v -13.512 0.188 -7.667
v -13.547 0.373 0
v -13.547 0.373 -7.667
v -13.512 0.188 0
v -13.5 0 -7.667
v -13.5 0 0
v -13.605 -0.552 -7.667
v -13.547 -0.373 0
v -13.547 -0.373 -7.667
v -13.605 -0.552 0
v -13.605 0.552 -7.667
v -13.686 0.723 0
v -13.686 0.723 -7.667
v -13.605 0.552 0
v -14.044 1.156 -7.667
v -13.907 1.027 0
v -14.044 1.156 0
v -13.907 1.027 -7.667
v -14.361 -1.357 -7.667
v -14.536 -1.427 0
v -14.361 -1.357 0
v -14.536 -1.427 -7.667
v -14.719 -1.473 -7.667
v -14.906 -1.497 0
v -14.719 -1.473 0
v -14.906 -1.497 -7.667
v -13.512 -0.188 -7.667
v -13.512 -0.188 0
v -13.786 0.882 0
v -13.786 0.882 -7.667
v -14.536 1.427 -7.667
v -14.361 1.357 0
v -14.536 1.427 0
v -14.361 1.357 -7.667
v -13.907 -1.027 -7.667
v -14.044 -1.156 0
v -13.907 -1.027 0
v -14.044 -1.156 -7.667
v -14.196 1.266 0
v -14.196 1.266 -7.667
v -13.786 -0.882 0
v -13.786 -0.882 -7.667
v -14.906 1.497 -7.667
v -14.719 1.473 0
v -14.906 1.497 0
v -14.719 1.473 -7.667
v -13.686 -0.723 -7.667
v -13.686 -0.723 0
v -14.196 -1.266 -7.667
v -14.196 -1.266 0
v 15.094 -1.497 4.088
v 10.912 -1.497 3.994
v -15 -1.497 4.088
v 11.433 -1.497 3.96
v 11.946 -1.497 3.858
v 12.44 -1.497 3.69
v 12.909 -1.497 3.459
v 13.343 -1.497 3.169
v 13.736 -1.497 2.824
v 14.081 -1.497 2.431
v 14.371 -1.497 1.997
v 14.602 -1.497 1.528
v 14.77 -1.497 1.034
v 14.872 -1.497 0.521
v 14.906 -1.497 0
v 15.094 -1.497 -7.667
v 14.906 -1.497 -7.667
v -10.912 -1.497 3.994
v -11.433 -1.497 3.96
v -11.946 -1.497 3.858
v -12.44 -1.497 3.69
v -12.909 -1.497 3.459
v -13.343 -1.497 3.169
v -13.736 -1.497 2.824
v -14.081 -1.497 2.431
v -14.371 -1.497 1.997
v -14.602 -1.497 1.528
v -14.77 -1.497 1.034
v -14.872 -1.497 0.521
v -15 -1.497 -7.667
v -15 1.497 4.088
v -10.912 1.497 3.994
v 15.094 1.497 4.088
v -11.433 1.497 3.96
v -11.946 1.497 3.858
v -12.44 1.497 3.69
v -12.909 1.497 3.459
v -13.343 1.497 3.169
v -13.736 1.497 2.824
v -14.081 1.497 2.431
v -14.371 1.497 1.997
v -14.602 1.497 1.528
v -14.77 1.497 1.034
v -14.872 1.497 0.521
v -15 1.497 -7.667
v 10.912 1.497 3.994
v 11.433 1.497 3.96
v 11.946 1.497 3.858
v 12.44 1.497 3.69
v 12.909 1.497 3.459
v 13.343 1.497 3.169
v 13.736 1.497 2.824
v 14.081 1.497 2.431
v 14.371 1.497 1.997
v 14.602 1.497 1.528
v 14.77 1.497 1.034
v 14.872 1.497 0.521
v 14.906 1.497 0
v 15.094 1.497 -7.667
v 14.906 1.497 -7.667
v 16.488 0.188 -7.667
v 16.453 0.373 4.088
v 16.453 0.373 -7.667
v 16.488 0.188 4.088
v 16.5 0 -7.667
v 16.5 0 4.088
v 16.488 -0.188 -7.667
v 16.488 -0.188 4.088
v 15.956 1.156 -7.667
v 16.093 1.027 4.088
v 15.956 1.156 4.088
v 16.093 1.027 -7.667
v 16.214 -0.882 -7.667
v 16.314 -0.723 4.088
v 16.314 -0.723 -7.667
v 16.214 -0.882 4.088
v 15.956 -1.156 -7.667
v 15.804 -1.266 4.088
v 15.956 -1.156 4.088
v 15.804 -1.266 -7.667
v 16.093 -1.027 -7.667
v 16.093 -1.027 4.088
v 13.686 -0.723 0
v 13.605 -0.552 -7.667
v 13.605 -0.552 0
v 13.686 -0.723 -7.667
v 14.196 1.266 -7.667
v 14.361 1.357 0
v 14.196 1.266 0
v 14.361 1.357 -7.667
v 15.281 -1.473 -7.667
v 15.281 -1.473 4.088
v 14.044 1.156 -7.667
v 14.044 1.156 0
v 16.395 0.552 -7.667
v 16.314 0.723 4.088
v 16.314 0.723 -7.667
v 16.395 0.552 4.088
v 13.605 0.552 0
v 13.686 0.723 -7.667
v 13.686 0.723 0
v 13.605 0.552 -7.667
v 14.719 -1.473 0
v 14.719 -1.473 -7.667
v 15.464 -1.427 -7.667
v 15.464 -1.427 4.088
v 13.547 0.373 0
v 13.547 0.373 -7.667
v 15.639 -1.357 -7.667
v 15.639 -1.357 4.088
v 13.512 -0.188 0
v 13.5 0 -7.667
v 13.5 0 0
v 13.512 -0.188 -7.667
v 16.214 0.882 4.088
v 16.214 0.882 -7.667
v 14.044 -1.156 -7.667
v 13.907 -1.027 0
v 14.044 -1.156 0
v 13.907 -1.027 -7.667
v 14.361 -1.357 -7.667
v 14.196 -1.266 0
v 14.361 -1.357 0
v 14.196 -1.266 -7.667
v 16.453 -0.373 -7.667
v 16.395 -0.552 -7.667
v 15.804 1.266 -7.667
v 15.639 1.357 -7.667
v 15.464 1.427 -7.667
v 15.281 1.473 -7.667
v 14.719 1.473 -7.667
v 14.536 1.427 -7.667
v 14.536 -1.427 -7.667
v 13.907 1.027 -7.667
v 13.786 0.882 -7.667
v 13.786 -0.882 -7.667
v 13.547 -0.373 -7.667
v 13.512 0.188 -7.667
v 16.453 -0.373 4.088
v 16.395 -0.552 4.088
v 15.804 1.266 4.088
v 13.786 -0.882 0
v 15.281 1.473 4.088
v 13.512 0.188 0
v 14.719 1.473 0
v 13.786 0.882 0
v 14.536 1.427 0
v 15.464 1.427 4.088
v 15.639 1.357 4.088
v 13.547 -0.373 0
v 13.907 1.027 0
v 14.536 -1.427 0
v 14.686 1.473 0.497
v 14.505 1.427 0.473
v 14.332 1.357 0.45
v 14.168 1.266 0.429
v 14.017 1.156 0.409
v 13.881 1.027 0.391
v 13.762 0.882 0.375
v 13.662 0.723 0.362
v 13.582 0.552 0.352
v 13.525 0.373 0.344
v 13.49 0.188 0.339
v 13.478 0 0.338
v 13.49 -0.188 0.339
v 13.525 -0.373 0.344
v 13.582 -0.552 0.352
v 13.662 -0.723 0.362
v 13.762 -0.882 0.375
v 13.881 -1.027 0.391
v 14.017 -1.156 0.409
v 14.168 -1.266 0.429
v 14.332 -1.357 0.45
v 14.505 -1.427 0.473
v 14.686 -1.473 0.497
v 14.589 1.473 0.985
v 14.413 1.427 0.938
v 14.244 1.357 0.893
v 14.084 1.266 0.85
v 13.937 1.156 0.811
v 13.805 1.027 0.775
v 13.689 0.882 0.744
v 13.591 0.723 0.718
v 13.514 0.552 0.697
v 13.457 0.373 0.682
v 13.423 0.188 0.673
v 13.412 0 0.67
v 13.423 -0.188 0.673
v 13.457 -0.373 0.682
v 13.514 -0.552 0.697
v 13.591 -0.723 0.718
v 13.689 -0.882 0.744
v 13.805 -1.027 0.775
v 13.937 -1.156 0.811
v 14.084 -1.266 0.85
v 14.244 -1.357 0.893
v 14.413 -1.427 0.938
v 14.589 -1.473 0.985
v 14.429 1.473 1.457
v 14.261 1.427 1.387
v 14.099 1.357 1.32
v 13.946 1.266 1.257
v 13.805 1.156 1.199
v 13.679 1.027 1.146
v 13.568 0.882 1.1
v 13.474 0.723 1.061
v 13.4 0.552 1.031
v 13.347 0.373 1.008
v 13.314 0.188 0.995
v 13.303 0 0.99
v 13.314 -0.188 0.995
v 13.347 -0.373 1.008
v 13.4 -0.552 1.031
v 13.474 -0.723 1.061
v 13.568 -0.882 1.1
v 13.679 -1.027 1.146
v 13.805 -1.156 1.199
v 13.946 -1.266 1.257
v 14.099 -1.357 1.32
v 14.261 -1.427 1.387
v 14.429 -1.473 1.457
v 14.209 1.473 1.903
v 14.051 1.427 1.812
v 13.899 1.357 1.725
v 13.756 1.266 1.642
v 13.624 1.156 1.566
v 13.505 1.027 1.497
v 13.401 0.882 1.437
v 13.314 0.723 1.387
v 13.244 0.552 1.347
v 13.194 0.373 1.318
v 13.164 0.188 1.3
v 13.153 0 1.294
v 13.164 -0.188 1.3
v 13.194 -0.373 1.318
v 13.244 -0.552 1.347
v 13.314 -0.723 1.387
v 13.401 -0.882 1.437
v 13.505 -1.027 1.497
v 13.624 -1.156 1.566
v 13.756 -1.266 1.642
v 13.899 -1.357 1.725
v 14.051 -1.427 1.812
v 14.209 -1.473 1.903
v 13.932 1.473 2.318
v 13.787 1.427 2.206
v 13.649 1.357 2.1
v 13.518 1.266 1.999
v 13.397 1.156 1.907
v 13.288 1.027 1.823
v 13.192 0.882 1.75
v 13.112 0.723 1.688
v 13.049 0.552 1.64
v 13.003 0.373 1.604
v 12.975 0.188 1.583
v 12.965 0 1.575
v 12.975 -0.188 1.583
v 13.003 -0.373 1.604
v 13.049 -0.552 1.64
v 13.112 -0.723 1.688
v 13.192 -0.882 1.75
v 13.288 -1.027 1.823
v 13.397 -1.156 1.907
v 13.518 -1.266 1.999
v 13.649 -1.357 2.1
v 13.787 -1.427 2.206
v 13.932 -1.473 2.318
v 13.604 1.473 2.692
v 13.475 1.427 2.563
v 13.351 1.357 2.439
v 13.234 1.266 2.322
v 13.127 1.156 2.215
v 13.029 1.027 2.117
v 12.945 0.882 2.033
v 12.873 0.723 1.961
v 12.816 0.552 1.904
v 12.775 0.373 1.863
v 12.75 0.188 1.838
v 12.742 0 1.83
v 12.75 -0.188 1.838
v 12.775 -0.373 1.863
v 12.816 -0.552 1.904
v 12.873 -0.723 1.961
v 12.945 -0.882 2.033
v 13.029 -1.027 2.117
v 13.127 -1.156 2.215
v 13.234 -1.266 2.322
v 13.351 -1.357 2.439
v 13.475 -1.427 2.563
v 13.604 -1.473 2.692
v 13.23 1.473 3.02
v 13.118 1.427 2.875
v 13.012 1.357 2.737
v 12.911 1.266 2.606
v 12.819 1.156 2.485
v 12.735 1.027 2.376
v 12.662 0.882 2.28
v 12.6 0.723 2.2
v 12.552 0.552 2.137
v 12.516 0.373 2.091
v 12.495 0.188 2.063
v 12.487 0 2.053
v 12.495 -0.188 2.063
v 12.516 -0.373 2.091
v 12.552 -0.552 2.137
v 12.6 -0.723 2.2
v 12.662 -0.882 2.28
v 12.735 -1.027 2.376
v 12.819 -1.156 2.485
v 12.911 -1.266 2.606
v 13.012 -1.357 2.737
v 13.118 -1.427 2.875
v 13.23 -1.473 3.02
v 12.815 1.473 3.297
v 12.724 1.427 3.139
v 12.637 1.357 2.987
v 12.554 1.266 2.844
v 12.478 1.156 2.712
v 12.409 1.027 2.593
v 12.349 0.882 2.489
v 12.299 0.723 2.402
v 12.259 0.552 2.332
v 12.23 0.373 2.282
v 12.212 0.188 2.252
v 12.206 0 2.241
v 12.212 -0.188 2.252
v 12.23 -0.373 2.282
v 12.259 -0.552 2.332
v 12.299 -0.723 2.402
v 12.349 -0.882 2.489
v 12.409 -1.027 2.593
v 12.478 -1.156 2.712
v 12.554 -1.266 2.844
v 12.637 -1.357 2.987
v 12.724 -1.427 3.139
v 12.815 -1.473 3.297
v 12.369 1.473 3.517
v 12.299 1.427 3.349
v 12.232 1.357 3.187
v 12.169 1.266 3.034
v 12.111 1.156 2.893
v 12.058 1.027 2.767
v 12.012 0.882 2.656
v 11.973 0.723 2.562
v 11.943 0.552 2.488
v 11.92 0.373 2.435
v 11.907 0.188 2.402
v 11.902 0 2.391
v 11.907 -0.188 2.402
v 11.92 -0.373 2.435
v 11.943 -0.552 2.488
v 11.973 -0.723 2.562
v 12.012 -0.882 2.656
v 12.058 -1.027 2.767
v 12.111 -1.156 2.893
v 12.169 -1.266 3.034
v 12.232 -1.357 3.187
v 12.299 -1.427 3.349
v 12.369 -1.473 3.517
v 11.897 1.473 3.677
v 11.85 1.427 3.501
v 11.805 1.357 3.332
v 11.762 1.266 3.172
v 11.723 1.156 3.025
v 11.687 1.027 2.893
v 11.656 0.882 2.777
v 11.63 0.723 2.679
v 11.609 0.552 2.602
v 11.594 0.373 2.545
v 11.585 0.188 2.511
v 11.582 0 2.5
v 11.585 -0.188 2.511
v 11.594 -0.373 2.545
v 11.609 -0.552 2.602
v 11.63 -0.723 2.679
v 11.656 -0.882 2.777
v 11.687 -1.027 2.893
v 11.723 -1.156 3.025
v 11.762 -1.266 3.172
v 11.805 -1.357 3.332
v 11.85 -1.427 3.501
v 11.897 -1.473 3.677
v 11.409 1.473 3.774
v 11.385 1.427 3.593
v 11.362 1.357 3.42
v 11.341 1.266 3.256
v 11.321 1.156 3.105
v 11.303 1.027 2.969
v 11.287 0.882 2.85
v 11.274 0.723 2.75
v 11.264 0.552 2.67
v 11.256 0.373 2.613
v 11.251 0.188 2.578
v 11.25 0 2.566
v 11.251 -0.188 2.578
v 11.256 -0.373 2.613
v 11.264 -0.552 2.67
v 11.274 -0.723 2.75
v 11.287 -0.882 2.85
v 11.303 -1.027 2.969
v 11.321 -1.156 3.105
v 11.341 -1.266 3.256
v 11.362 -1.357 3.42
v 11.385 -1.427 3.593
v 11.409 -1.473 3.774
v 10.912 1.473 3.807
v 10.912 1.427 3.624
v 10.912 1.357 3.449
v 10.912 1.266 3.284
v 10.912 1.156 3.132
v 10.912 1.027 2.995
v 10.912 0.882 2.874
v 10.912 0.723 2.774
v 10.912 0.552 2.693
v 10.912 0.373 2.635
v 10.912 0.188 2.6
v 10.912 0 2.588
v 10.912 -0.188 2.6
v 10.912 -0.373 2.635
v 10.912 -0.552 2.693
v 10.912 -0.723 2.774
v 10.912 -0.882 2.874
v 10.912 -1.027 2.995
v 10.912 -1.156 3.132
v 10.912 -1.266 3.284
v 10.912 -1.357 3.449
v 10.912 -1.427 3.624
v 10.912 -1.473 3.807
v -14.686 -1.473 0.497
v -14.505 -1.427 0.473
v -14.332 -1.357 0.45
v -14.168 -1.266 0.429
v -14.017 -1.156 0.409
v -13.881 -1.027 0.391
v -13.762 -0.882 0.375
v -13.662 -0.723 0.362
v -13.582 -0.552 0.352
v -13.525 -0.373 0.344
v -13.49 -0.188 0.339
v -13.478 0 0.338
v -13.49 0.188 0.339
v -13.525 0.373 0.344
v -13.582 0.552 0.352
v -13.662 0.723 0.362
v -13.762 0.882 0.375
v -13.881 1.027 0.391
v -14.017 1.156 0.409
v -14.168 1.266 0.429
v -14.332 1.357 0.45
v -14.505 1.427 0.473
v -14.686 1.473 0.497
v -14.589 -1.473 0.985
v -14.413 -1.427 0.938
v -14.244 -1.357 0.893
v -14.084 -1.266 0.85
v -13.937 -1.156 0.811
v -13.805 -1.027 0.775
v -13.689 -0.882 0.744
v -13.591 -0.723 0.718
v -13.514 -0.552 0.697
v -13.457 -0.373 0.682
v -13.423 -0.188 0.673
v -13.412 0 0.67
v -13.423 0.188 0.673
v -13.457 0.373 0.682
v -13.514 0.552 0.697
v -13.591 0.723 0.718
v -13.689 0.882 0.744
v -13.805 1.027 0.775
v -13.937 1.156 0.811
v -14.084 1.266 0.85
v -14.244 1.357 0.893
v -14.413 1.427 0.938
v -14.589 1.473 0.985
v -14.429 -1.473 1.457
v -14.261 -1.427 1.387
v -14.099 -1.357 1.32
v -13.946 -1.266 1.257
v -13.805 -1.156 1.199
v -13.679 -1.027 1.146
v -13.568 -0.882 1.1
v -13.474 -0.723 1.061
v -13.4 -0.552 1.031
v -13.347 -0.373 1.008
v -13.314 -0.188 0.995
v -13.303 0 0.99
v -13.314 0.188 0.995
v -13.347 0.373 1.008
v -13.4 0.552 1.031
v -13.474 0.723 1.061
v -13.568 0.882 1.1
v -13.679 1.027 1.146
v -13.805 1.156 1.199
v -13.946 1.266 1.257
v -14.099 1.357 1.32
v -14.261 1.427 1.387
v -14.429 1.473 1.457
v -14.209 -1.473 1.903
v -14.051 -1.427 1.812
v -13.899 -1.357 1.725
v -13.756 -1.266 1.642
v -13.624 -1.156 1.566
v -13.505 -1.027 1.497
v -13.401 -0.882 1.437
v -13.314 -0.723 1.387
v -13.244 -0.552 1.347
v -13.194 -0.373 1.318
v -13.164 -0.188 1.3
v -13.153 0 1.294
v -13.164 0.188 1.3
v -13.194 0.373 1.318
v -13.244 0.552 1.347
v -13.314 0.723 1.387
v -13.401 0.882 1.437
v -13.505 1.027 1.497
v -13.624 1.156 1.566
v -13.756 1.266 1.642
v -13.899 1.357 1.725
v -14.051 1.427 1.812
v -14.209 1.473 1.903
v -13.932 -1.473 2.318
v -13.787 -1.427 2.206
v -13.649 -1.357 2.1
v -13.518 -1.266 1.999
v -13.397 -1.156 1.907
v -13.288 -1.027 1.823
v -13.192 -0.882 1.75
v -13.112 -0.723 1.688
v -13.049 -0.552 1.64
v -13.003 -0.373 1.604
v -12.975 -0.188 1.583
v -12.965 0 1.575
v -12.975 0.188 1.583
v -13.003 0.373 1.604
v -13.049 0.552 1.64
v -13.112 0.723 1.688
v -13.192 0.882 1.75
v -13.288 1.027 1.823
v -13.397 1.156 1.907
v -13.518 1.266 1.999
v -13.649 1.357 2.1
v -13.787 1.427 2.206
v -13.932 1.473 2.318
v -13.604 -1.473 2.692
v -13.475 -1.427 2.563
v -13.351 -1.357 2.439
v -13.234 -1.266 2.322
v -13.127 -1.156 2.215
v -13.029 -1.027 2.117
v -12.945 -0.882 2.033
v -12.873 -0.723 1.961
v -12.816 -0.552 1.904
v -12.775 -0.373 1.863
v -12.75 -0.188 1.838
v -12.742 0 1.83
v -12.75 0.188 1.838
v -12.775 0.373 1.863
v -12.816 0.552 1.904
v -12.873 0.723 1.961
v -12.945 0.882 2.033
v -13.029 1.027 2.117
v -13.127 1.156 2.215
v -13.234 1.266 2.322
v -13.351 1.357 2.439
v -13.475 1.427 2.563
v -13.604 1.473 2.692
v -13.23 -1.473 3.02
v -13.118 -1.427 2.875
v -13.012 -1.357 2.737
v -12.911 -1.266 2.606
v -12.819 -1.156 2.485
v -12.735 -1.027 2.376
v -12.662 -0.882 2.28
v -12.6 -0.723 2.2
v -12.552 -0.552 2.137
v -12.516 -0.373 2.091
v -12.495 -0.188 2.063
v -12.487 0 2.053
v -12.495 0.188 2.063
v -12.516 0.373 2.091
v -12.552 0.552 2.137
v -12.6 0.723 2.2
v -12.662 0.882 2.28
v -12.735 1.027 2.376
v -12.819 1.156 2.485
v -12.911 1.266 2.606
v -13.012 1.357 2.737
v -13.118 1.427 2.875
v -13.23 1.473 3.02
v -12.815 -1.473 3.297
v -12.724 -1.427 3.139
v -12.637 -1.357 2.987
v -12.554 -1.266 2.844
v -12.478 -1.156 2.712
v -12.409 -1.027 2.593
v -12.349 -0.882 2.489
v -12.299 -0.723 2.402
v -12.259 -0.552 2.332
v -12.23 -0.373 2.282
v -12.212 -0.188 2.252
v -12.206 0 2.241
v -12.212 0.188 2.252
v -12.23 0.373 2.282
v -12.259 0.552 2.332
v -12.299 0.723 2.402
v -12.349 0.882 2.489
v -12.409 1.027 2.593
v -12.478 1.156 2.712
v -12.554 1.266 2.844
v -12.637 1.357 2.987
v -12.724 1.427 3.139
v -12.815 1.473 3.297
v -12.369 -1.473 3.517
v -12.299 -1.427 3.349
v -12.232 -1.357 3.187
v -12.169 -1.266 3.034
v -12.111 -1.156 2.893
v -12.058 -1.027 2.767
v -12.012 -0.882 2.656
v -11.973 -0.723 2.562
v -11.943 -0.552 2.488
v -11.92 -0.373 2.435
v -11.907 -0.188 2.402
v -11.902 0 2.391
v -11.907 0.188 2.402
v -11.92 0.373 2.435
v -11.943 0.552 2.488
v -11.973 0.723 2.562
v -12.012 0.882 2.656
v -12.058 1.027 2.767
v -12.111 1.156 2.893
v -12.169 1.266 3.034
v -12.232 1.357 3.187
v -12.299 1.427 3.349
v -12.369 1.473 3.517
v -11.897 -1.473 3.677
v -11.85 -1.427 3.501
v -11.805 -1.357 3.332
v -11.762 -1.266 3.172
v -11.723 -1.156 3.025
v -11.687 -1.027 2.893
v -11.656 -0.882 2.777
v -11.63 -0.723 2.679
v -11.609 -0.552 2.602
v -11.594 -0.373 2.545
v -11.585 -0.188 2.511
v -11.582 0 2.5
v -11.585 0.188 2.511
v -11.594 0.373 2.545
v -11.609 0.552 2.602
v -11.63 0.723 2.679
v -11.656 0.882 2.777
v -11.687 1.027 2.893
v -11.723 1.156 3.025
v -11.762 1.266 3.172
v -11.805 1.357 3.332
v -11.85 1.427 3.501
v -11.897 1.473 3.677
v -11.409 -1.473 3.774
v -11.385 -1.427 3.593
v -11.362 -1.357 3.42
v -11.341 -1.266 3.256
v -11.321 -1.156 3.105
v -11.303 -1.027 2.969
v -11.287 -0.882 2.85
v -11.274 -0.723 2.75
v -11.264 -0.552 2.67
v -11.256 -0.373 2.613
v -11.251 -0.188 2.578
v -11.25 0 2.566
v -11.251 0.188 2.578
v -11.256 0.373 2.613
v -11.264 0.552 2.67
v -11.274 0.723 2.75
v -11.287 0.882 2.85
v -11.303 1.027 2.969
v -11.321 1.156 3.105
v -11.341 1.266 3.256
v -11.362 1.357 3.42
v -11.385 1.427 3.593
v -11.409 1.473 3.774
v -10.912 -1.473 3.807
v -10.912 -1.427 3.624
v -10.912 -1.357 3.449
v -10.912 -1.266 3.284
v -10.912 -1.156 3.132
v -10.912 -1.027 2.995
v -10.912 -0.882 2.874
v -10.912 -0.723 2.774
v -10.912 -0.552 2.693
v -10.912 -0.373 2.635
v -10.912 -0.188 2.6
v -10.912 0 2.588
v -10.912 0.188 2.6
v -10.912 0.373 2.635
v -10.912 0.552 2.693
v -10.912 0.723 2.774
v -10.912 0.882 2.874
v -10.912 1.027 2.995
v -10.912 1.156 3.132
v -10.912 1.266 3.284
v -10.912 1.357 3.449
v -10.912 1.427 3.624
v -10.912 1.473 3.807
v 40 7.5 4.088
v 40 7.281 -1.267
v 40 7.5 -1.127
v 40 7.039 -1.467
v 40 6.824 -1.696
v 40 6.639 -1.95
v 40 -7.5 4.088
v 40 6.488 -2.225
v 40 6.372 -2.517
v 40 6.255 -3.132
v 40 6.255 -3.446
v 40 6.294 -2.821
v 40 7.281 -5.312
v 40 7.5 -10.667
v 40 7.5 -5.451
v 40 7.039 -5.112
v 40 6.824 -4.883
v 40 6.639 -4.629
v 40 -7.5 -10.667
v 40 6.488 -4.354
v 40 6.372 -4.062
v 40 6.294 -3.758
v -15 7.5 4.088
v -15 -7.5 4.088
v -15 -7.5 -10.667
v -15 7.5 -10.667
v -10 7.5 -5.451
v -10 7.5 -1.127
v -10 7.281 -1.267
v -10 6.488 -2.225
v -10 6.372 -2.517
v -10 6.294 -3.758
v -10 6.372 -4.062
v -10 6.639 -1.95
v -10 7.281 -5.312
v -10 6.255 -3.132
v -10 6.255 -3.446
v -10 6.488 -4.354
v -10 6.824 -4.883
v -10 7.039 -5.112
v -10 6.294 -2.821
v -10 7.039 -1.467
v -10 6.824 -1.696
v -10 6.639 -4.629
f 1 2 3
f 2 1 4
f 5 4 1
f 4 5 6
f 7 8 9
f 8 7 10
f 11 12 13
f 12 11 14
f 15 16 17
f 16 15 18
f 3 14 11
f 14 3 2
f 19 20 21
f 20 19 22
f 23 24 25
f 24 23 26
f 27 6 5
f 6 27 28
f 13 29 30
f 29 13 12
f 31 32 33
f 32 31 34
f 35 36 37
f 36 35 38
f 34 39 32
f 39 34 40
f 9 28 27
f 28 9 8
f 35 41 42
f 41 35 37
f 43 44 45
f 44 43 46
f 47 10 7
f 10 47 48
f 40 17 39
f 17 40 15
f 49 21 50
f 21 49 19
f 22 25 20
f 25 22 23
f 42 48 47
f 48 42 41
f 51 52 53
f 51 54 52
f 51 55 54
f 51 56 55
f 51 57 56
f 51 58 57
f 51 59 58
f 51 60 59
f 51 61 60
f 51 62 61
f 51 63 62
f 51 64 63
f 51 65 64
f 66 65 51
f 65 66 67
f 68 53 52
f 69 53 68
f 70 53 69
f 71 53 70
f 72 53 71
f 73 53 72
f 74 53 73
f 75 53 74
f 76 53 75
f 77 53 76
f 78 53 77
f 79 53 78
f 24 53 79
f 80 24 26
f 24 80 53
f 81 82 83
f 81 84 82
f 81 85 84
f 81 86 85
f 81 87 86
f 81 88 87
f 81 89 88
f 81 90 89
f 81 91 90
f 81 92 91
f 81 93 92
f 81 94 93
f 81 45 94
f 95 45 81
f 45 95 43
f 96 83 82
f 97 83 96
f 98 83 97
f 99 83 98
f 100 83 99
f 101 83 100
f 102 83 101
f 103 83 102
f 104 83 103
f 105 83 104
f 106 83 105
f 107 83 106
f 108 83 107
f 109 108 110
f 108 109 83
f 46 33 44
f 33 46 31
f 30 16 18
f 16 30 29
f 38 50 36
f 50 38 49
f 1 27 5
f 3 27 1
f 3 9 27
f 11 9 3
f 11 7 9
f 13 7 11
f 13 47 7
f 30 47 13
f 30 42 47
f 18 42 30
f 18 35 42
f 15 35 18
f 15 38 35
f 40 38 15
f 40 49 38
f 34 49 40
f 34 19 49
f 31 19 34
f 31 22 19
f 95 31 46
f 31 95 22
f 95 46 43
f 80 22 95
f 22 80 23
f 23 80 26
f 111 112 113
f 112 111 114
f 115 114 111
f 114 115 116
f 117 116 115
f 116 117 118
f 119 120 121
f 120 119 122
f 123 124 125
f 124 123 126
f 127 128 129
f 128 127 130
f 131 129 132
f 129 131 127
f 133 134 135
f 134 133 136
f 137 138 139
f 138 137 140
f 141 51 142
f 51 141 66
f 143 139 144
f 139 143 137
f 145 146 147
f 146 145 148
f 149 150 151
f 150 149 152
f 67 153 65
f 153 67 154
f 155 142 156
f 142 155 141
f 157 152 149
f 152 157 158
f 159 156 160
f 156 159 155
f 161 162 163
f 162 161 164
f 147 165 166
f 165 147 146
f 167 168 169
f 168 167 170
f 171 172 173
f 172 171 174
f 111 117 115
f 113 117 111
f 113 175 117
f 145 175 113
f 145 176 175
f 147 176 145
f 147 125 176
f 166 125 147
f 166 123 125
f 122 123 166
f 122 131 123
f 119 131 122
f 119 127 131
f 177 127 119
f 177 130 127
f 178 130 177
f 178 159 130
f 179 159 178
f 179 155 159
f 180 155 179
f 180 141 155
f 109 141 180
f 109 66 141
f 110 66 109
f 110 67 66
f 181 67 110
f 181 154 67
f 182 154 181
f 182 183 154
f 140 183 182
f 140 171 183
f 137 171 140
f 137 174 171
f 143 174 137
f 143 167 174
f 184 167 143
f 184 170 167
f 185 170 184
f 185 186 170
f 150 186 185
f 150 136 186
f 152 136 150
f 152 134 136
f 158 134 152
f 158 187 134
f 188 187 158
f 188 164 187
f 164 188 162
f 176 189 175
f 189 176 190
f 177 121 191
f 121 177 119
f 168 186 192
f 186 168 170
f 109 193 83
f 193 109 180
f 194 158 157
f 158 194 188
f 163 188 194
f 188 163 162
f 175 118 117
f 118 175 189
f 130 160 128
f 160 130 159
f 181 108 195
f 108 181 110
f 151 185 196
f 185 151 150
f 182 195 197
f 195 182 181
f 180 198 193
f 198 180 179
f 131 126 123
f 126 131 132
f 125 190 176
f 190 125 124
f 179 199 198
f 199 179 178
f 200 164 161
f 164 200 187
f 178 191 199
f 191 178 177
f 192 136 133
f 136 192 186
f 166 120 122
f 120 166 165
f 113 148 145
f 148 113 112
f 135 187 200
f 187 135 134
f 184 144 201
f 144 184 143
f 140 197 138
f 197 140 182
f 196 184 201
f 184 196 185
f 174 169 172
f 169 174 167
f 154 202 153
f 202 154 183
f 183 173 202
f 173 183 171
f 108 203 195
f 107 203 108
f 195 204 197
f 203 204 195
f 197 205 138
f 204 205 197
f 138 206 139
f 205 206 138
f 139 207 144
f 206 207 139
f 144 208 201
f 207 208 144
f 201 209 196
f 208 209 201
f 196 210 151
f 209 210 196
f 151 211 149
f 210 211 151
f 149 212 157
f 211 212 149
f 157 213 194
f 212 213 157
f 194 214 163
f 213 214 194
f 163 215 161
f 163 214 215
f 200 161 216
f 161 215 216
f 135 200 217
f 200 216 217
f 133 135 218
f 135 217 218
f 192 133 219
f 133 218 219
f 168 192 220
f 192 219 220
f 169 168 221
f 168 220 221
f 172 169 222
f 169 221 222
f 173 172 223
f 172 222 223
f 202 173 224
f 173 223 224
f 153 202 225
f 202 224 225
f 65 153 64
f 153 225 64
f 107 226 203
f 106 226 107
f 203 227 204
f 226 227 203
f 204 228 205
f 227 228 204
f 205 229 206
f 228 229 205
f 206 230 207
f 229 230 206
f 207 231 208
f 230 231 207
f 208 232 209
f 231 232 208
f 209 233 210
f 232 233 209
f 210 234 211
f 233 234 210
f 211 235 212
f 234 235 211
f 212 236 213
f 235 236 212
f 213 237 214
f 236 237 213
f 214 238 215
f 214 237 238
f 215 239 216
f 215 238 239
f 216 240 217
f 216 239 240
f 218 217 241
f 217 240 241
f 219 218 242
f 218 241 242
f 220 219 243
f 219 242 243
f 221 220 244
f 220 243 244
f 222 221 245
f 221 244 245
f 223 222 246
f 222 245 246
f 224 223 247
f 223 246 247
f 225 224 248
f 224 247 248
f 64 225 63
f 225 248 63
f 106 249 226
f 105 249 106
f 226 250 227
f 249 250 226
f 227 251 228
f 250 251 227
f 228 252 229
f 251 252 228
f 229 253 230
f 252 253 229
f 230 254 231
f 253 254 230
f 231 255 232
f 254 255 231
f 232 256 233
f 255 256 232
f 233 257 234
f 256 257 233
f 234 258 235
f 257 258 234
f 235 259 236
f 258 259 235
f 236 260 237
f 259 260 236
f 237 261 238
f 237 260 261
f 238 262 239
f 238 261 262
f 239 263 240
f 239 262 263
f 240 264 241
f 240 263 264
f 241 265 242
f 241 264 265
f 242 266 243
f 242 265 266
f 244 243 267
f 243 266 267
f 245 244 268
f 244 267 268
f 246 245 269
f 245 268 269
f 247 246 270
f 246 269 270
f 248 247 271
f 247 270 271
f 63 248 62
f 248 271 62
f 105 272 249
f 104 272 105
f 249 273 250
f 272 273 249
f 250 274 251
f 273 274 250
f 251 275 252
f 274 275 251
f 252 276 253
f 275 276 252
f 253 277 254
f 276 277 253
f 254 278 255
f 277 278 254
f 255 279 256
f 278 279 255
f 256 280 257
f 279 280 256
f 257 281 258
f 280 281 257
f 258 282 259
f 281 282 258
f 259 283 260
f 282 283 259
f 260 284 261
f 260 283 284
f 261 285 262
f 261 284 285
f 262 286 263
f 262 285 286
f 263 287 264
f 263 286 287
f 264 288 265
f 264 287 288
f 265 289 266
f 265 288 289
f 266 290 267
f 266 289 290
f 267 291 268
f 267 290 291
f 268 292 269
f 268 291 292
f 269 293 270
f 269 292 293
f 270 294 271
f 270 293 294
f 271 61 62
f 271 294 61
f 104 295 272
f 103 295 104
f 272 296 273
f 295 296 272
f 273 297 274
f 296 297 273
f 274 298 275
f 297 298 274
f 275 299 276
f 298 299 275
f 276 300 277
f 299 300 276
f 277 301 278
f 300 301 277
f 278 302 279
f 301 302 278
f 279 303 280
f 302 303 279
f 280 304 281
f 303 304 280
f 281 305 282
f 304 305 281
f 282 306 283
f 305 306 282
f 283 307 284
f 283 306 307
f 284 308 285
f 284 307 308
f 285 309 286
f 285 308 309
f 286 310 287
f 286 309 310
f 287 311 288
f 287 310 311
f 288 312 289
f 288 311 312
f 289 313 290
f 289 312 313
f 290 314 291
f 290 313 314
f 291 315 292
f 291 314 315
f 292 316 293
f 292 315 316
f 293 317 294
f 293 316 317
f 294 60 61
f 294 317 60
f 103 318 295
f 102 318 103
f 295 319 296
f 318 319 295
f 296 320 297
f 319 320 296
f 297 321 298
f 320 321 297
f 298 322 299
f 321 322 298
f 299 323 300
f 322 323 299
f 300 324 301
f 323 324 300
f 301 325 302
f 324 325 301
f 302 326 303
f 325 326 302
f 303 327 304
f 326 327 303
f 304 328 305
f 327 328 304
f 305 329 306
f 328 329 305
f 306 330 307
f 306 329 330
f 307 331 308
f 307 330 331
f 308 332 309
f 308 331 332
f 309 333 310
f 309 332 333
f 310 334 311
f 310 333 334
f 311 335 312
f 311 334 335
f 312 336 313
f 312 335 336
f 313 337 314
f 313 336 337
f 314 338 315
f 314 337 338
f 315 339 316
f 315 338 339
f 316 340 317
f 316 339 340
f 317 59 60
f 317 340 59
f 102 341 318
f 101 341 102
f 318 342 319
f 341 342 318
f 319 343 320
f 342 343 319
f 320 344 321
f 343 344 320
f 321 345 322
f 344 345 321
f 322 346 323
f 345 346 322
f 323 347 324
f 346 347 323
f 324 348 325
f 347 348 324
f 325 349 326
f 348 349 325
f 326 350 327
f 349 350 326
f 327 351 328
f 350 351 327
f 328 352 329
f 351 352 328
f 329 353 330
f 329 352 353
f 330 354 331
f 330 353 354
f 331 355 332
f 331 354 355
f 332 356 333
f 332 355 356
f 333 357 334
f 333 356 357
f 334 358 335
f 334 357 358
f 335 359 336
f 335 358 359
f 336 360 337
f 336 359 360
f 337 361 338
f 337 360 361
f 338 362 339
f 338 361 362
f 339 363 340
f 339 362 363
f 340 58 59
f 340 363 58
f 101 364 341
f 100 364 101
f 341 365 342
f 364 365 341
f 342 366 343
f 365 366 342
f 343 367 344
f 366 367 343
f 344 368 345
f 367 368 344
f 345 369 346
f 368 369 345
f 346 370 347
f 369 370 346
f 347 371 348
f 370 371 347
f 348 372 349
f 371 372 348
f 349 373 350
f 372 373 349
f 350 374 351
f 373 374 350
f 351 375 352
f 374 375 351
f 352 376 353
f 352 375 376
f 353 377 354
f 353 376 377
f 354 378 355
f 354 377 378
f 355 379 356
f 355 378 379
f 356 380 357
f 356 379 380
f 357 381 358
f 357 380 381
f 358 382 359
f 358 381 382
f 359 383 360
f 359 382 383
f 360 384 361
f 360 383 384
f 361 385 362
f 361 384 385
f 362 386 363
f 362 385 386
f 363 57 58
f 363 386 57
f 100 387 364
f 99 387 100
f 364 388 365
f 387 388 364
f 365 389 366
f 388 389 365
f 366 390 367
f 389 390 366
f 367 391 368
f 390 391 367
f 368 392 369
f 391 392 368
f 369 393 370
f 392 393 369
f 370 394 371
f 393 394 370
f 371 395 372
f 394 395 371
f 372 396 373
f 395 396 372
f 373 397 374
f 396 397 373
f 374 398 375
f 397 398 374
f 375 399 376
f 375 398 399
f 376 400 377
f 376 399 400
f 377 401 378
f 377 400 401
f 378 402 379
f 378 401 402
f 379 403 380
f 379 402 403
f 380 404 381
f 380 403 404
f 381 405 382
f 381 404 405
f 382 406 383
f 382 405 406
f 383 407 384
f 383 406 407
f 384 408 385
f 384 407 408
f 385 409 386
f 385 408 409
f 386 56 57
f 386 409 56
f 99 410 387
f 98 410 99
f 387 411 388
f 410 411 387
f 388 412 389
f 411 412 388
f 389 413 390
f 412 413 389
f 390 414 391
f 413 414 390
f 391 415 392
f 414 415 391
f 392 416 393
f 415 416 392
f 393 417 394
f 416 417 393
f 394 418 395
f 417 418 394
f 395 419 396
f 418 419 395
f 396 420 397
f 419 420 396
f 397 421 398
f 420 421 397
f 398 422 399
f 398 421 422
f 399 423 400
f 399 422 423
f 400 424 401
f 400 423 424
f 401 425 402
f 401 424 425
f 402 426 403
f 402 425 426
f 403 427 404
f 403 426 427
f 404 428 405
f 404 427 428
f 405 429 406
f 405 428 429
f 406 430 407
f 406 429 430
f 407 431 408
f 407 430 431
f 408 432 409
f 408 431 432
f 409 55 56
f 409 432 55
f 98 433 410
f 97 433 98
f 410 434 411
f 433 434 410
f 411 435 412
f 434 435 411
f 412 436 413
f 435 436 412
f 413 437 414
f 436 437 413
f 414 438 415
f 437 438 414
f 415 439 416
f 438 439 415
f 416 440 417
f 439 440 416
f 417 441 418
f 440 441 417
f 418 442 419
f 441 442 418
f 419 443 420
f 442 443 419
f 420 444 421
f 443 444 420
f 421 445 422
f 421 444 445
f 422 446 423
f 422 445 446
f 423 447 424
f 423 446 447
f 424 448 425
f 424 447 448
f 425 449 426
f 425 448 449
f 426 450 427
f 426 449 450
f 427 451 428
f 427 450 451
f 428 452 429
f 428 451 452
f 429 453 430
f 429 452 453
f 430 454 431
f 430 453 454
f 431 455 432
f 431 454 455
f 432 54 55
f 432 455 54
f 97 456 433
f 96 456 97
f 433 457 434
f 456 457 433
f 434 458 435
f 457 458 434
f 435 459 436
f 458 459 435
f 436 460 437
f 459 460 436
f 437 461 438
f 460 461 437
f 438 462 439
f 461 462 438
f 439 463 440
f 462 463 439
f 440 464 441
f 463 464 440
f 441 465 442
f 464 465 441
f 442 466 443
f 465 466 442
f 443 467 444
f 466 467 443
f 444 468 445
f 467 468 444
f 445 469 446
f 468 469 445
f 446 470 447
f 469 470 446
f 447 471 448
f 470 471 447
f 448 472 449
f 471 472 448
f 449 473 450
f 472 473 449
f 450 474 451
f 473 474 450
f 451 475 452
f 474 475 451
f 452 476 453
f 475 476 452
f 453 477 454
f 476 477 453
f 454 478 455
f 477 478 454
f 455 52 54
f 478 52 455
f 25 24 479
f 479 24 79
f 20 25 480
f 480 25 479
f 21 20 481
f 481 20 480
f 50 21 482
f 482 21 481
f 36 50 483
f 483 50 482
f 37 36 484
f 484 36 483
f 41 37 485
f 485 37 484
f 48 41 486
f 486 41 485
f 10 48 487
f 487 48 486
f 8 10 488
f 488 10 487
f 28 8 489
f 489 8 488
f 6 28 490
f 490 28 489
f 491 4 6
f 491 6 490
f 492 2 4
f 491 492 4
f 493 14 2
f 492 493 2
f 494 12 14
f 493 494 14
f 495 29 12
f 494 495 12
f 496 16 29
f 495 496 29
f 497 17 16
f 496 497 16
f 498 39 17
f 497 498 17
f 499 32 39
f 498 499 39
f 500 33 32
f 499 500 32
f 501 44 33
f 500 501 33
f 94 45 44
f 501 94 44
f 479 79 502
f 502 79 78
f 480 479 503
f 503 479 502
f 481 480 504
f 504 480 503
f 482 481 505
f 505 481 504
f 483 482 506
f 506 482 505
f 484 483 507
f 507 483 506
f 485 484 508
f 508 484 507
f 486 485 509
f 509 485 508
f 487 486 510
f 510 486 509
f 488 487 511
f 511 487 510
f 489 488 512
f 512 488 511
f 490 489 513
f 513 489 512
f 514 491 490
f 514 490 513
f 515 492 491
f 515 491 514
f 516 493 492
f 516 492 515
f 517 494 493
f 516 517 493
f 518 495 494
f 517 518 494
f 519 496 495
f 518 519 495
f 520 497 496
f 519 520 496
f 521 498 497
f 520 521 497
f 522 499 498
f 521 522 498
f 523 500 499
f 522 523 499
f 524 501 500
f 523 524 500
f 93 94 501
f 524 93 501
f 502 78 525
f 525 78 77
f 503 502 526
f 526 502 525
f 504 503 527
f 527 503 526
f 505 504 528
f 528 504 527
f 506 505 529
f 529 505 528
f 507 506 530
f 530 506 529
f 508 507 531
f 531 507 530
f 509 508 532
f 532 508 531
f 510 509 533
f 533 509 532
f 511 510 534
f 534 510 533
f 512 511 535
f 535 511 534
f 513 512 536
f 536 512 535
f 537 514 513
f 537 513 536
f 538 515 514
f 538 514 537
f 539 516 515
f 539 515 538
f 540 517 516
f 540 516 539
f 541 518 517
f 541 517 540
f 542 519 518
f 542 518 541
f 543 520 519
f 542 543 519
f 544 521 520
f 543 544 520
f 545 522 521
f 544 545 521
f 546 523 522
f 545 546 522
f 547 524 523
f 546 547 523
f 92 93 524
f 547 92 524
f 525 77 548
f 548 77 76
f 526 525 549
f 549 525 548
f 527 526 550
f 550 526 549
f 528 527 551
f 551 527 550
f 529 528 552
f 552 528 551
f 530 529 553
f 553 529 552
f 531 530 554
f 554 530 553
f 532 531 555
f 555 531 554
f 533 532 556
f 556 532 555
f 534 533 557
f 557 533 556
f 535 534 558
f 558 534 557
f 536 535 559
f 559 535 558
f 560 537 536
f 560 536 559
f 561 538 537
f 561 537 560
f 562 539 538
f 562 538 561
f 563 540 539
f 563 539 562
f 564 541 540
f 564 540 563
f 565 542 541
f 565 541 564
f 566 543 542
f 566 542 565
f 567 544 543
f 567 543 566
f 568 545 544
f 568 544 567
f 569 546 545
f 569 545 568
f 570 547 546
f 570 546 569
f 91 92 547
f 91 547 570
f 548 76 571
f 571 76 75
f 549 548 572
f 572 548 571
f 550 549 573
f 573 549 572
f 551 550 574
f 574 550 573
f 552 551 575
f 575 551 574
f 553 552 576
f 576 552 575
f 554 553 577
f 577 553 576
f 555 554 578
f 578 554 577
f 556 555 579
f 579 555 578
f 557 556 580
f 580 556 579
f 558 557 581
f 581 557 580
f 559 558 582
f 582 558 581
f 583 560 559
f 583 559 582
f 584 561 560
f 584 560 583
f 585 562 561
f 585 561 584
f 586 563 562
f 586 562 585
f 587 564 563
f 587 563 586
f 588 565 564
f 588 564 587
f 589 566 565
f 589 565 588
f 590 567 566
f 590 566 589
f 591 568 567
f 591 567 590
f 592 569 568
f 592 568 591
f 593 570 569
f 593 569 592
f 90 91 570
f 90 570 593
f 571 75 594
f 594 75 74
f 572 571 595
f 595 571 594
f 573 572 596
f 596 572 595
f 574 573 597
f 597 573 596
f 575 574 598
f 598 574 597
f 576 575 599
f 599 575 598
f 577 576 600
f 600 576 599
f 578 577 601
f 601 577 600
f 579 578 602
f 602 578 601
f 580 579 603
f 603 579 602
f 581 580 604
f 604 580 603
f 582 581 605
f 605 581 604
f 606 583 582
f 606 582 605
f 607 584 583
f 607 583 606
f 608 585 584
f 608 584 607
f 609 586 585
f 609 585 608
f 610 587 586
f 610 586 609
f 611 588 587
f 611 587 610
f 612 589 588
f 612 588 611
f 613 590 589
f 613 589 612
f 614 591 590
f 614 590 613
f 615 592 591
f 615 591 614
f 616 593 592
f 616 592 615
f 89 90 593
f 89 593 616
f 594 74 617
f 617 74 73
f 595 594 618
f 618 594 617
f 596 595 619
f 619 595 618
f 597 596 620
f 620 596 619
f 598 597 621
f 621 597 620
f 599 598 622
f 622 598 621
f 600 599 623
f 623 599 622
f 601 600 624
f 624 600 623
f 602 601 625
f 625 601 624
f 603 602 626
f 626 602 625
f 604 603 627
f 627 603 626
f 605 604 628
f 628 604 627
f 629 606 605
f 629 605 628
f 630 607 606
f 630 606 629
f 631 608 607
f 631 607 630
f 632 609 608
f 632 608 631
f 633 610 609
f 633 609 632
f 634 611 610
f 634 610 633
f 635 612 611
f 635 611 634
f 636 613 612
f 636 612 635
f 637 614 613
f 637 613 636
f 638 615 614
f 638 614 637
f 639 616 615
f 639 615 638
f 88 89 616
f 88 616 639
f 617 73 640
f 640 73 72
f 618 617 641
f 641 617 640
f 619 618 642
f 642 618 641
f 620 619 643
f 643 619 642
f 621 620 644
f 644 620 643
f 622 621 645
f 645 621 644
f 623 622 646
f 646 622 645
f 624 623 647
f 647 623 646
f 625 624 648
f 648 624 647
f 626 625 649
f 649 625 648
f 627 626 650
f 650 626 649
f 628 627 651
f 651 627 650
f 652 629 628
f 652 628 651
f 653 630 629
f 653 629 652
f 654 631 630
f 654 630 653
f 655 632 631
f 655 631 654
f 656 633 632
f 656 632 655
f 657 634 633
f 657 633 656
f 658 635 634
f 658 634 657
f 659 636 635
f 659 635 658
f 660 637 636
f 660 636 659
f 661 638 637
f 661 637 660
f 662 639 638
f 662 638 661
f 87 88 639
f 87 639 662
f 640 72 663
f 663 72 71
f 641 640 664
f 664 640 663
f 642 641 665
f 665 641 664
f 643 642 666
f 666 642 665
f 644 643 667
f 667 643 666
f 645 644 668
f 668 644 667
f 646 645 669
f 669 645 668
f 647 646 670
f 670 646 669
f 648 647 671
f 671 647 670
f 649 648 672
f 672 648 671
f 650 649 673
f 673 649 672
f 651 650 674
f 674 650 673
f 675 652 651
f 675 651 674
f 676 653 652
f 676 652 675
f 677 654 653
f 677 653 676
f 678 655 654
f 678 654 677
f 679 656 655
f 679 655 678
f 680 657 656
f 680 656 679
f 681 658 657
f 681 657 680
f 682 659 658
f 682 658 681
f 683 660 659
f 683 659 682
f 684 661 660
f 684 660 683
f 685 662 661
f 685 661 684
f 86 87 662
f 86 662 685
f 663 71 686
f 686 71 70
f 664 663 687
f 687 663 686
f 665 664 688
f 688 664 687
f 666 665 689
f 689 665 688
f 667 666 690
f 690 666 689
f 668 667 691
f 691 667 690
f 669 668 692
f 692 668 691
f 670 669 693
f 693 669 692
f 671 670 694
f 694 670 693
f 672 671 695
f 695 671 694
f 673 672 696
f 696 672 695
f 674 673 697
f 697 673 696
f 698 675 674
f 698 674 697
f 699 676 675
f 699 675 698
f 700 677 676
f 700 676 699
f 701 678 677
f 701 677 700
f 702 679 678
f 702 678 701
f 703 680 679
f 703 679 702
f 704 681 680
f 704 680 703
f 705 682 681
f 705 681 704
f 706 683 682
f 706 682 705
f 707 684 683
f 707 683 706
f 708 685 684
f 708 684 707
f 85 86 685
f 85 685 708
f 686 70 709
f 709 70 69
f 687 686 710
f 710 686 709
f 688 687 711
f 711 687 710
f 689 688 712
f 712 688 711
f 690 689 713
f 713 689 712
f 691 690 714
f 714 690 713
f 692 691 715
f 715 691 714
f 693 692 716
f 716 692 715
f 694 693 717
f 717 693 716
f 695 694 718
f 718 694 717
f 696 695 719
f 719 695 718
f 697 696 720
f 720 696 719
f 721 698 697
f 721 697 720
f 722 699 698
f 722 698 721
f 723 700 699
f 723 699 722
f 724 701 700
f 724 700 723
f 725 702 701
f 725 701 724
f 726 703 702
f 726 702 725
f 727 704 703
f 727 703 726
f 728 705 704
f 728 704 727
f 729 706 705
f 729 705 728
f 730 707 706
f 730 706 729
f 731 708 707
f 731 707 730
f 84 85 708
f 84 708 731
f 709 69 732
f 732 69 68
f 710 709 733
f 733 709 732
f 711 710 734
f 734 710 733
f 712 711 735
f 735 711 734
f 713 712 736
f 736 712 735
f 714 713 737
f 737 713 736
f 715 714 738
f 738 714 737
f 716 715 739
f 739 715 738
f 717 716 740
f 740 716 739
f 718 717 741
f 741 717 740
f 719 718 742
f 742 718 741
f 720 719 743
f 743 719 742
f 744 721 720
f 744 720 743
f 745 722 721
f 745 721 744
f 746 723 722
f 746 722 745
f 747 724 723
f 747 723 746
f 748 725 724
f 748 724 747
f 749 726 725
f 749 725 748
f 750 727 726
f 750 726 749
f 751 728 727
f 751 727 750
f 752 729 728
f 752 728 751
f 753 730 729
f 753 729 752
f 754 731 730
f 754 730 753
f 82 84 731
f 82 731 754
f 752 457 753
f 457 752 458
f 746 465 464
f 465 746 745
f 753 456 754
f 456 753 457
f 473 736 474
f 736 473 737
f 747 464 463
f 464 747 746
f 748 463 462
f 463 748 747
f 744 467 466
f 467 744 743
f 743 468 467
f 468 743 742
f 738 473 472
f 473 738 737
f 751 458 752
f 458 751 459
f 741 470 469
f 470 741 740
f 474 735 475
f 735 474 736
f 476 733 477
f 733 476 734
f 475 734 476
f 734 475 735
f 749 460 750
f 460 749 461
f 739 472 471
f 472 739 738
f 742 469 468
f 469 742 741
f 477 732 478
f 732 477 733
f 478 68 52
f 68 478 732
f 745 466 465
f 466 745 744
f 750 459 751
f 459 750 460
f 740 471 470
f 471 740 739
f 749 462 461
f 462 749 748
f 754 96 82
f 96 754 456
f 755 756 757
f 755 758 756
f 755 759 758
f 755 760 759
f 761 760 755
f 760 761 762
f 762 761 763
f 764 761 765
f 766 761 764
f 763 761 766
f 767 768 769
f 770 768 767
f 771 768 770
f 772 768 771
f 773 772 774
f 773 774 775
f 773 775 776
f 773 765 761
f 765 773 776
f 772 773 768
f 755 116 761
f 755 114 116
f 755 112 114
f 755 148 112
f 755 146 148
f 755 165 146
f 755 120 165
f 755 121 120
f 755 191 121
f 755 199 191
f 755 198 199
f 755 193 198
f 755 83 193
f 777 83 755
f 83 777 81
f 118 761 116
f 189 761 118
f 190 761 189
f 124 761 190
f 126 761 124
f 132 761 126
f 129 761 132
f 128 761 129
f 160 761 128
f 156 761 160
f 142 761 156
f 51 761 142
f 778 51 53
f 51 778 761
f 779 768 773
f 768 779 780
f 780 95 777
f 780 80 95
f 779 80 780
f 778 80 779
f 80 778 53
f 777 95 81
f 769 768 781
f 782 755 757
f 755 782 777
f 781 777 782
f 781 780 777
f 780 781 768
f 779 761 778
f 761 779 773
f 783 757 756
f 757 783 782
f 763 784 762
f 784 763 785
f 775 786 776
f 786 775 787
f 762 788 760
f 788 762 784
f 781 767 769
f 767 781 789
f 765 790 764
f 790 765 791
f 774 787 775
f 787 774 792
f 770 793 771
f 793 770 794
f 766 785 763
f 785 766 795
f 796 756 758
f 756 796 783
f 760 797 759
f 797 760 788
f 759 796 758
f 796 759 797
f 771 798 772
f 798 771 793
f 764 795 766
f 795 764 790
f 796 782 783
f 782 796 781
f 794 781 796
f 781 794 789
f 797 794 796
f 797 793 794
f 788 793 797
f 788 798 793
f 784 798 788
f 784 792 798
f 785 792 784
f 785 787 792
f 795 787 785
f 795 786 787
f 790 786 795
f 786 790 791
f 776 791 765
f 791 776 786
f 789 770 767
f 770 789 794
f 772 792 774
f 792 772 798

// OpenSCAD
/**
 * Bending jig for creating thermal fuse links for Milton-based hotplate PCBs.
 * 
 * Use 10AWG or 6mm^2 solid copper wire for the fuse element. This is required
 * for ensuring sufficient mass rather than conductivity, although the conductivity
 * doesn't hurt.
 *
 * 1. Use the length gauge on the side to cut wire to correct length.
 * 2. Insert one end of the link into the hole until it touches the bottom.
 * 3. Bend the wire down into the groove.
 * 3. Remove the wire and insert the other end into the hole.
 * 4. Ensure that the first bend is aligned with the direction of the groove.
 * 5. Bend the wire down into the groove. The wire should fit neatly into the groove
 *    that wraps around the end of the jig.
 *
 * It is advised to pre-tin the ends of your link with high-temperature solder before
 * soldering in place on your hotplate. SN100C/CQ100Ge/K100LD or similar solder alloys
 * with approximately 99.3% tin and 0.7% copper or similar and a melting point of 227
 * celsius are recommended.
 *
 * This jig design is part of Milton: The Makeshift Melt-Master - a system for
 * controlling solder reflow hotplates.
 *
 * Copyright (C) 2025 Brett Gersekowski
 *
 * See the file LICENCE.md for full licence details. If you received this file
 * separately and not packaged with the rest of the source code you can find it
 * online at https://github.com/brettski74/Milton
 */
 
$fn = 50;

PI = 3.14159265358979323846264338;
copperDensity = 8940 * 1e3 / 1e9; //(g/mm^3)

// Wire diameter in mm 10AWG = 2.588
AWG_10 = 2.588;

module wireBend(centreRad, wireDiam) {
  rotate([90, 0, 0])
  rotate_extrude(angle = 90, convexity = 2)
    translate([centreRad, 0])
      circle(r=wireDiam/2);
}

module thermalFuseLink(wireDiam=2.588
                     , holeDiam
                     , innerRad=2.588
                     , linkSep=30
                     , linkLen=50
                     , relief=true
                     ) {
  holeDiameter = is_undef(holeDiam) ? wireDiam + 0.6 : holeDiam;
  holeRadius = holeDiameter / 2;
  centreRadius = innerRad + holeDiameter/2;
  // straight vertical section length
  rise = (linkLen - linkSep + (2 - PI)*centreRadius)/2;
  echo(rise = rise);

  if (relief) {
    difference() {
      translate([-linkSep/2,-2.5*holeDiameter,-rise-3])
        cube([linkLen+5, holeDiameter*5, centreRadius + rise + 3]);
      thermalFuseLink(wireDiam=wireDiam
                    , holeDiam=holeDiam
                    , innerRad=innerRad
                    , linkSep=linkSep
                    , linkLen=linkLen
                    , relief=false
                    );
      difference() {
        hull()
          for(i=[-1,1]/2)
            translate([i*linkSep, 0, 0])
              cylinder(r=holeRadius, h=holeRadius+centreRadius);
        
        hull()
          for(j=[-1,1]/2)
            translate([j*(linkSep-2*centreRadius), 0, 0])
              rotate([90,0,0])
                cylinder(r=centreRadius, h=holeDiameter, center=true);
      }
      
      #translate([linkLen+5 - linkSep/2,2.5*holeDiam + 1.25,(centreRadius-rise-3)/2])
        rotate([0,-90,0])
          cylinder(r=2.5, h=linkLen);
    }
  } else {
    translate([linkSep/2 - centreRadius, 0, 0])
      wireBend(centreRad=centreRadius
             , wireDiam=holeDiameter);
    translate([centreRadius - linkSep/2, 0, 0])
      rotate([0,0,180])
        wireBend(centreRad=centreRadius, wireDiam=holeDiameter);

    translate([0,0,centreRadius])
      rotate([0, 90, 0])
        cylinder(r=holeRadius, h=linkSep - 2*centreRadius, center=true);
                       
    for(i=[-1,1]/2) {
      translate([i*linkSep, 0, -rise])
        cylinder(r=holeRadius, h=rise);
    }
  }
}

thermalFuseLink(wireDiam=AWG_10
              , holeDiam=3
              , innerRad=AWG_10
              , linkSep=30
              , linkLen=50
              );
